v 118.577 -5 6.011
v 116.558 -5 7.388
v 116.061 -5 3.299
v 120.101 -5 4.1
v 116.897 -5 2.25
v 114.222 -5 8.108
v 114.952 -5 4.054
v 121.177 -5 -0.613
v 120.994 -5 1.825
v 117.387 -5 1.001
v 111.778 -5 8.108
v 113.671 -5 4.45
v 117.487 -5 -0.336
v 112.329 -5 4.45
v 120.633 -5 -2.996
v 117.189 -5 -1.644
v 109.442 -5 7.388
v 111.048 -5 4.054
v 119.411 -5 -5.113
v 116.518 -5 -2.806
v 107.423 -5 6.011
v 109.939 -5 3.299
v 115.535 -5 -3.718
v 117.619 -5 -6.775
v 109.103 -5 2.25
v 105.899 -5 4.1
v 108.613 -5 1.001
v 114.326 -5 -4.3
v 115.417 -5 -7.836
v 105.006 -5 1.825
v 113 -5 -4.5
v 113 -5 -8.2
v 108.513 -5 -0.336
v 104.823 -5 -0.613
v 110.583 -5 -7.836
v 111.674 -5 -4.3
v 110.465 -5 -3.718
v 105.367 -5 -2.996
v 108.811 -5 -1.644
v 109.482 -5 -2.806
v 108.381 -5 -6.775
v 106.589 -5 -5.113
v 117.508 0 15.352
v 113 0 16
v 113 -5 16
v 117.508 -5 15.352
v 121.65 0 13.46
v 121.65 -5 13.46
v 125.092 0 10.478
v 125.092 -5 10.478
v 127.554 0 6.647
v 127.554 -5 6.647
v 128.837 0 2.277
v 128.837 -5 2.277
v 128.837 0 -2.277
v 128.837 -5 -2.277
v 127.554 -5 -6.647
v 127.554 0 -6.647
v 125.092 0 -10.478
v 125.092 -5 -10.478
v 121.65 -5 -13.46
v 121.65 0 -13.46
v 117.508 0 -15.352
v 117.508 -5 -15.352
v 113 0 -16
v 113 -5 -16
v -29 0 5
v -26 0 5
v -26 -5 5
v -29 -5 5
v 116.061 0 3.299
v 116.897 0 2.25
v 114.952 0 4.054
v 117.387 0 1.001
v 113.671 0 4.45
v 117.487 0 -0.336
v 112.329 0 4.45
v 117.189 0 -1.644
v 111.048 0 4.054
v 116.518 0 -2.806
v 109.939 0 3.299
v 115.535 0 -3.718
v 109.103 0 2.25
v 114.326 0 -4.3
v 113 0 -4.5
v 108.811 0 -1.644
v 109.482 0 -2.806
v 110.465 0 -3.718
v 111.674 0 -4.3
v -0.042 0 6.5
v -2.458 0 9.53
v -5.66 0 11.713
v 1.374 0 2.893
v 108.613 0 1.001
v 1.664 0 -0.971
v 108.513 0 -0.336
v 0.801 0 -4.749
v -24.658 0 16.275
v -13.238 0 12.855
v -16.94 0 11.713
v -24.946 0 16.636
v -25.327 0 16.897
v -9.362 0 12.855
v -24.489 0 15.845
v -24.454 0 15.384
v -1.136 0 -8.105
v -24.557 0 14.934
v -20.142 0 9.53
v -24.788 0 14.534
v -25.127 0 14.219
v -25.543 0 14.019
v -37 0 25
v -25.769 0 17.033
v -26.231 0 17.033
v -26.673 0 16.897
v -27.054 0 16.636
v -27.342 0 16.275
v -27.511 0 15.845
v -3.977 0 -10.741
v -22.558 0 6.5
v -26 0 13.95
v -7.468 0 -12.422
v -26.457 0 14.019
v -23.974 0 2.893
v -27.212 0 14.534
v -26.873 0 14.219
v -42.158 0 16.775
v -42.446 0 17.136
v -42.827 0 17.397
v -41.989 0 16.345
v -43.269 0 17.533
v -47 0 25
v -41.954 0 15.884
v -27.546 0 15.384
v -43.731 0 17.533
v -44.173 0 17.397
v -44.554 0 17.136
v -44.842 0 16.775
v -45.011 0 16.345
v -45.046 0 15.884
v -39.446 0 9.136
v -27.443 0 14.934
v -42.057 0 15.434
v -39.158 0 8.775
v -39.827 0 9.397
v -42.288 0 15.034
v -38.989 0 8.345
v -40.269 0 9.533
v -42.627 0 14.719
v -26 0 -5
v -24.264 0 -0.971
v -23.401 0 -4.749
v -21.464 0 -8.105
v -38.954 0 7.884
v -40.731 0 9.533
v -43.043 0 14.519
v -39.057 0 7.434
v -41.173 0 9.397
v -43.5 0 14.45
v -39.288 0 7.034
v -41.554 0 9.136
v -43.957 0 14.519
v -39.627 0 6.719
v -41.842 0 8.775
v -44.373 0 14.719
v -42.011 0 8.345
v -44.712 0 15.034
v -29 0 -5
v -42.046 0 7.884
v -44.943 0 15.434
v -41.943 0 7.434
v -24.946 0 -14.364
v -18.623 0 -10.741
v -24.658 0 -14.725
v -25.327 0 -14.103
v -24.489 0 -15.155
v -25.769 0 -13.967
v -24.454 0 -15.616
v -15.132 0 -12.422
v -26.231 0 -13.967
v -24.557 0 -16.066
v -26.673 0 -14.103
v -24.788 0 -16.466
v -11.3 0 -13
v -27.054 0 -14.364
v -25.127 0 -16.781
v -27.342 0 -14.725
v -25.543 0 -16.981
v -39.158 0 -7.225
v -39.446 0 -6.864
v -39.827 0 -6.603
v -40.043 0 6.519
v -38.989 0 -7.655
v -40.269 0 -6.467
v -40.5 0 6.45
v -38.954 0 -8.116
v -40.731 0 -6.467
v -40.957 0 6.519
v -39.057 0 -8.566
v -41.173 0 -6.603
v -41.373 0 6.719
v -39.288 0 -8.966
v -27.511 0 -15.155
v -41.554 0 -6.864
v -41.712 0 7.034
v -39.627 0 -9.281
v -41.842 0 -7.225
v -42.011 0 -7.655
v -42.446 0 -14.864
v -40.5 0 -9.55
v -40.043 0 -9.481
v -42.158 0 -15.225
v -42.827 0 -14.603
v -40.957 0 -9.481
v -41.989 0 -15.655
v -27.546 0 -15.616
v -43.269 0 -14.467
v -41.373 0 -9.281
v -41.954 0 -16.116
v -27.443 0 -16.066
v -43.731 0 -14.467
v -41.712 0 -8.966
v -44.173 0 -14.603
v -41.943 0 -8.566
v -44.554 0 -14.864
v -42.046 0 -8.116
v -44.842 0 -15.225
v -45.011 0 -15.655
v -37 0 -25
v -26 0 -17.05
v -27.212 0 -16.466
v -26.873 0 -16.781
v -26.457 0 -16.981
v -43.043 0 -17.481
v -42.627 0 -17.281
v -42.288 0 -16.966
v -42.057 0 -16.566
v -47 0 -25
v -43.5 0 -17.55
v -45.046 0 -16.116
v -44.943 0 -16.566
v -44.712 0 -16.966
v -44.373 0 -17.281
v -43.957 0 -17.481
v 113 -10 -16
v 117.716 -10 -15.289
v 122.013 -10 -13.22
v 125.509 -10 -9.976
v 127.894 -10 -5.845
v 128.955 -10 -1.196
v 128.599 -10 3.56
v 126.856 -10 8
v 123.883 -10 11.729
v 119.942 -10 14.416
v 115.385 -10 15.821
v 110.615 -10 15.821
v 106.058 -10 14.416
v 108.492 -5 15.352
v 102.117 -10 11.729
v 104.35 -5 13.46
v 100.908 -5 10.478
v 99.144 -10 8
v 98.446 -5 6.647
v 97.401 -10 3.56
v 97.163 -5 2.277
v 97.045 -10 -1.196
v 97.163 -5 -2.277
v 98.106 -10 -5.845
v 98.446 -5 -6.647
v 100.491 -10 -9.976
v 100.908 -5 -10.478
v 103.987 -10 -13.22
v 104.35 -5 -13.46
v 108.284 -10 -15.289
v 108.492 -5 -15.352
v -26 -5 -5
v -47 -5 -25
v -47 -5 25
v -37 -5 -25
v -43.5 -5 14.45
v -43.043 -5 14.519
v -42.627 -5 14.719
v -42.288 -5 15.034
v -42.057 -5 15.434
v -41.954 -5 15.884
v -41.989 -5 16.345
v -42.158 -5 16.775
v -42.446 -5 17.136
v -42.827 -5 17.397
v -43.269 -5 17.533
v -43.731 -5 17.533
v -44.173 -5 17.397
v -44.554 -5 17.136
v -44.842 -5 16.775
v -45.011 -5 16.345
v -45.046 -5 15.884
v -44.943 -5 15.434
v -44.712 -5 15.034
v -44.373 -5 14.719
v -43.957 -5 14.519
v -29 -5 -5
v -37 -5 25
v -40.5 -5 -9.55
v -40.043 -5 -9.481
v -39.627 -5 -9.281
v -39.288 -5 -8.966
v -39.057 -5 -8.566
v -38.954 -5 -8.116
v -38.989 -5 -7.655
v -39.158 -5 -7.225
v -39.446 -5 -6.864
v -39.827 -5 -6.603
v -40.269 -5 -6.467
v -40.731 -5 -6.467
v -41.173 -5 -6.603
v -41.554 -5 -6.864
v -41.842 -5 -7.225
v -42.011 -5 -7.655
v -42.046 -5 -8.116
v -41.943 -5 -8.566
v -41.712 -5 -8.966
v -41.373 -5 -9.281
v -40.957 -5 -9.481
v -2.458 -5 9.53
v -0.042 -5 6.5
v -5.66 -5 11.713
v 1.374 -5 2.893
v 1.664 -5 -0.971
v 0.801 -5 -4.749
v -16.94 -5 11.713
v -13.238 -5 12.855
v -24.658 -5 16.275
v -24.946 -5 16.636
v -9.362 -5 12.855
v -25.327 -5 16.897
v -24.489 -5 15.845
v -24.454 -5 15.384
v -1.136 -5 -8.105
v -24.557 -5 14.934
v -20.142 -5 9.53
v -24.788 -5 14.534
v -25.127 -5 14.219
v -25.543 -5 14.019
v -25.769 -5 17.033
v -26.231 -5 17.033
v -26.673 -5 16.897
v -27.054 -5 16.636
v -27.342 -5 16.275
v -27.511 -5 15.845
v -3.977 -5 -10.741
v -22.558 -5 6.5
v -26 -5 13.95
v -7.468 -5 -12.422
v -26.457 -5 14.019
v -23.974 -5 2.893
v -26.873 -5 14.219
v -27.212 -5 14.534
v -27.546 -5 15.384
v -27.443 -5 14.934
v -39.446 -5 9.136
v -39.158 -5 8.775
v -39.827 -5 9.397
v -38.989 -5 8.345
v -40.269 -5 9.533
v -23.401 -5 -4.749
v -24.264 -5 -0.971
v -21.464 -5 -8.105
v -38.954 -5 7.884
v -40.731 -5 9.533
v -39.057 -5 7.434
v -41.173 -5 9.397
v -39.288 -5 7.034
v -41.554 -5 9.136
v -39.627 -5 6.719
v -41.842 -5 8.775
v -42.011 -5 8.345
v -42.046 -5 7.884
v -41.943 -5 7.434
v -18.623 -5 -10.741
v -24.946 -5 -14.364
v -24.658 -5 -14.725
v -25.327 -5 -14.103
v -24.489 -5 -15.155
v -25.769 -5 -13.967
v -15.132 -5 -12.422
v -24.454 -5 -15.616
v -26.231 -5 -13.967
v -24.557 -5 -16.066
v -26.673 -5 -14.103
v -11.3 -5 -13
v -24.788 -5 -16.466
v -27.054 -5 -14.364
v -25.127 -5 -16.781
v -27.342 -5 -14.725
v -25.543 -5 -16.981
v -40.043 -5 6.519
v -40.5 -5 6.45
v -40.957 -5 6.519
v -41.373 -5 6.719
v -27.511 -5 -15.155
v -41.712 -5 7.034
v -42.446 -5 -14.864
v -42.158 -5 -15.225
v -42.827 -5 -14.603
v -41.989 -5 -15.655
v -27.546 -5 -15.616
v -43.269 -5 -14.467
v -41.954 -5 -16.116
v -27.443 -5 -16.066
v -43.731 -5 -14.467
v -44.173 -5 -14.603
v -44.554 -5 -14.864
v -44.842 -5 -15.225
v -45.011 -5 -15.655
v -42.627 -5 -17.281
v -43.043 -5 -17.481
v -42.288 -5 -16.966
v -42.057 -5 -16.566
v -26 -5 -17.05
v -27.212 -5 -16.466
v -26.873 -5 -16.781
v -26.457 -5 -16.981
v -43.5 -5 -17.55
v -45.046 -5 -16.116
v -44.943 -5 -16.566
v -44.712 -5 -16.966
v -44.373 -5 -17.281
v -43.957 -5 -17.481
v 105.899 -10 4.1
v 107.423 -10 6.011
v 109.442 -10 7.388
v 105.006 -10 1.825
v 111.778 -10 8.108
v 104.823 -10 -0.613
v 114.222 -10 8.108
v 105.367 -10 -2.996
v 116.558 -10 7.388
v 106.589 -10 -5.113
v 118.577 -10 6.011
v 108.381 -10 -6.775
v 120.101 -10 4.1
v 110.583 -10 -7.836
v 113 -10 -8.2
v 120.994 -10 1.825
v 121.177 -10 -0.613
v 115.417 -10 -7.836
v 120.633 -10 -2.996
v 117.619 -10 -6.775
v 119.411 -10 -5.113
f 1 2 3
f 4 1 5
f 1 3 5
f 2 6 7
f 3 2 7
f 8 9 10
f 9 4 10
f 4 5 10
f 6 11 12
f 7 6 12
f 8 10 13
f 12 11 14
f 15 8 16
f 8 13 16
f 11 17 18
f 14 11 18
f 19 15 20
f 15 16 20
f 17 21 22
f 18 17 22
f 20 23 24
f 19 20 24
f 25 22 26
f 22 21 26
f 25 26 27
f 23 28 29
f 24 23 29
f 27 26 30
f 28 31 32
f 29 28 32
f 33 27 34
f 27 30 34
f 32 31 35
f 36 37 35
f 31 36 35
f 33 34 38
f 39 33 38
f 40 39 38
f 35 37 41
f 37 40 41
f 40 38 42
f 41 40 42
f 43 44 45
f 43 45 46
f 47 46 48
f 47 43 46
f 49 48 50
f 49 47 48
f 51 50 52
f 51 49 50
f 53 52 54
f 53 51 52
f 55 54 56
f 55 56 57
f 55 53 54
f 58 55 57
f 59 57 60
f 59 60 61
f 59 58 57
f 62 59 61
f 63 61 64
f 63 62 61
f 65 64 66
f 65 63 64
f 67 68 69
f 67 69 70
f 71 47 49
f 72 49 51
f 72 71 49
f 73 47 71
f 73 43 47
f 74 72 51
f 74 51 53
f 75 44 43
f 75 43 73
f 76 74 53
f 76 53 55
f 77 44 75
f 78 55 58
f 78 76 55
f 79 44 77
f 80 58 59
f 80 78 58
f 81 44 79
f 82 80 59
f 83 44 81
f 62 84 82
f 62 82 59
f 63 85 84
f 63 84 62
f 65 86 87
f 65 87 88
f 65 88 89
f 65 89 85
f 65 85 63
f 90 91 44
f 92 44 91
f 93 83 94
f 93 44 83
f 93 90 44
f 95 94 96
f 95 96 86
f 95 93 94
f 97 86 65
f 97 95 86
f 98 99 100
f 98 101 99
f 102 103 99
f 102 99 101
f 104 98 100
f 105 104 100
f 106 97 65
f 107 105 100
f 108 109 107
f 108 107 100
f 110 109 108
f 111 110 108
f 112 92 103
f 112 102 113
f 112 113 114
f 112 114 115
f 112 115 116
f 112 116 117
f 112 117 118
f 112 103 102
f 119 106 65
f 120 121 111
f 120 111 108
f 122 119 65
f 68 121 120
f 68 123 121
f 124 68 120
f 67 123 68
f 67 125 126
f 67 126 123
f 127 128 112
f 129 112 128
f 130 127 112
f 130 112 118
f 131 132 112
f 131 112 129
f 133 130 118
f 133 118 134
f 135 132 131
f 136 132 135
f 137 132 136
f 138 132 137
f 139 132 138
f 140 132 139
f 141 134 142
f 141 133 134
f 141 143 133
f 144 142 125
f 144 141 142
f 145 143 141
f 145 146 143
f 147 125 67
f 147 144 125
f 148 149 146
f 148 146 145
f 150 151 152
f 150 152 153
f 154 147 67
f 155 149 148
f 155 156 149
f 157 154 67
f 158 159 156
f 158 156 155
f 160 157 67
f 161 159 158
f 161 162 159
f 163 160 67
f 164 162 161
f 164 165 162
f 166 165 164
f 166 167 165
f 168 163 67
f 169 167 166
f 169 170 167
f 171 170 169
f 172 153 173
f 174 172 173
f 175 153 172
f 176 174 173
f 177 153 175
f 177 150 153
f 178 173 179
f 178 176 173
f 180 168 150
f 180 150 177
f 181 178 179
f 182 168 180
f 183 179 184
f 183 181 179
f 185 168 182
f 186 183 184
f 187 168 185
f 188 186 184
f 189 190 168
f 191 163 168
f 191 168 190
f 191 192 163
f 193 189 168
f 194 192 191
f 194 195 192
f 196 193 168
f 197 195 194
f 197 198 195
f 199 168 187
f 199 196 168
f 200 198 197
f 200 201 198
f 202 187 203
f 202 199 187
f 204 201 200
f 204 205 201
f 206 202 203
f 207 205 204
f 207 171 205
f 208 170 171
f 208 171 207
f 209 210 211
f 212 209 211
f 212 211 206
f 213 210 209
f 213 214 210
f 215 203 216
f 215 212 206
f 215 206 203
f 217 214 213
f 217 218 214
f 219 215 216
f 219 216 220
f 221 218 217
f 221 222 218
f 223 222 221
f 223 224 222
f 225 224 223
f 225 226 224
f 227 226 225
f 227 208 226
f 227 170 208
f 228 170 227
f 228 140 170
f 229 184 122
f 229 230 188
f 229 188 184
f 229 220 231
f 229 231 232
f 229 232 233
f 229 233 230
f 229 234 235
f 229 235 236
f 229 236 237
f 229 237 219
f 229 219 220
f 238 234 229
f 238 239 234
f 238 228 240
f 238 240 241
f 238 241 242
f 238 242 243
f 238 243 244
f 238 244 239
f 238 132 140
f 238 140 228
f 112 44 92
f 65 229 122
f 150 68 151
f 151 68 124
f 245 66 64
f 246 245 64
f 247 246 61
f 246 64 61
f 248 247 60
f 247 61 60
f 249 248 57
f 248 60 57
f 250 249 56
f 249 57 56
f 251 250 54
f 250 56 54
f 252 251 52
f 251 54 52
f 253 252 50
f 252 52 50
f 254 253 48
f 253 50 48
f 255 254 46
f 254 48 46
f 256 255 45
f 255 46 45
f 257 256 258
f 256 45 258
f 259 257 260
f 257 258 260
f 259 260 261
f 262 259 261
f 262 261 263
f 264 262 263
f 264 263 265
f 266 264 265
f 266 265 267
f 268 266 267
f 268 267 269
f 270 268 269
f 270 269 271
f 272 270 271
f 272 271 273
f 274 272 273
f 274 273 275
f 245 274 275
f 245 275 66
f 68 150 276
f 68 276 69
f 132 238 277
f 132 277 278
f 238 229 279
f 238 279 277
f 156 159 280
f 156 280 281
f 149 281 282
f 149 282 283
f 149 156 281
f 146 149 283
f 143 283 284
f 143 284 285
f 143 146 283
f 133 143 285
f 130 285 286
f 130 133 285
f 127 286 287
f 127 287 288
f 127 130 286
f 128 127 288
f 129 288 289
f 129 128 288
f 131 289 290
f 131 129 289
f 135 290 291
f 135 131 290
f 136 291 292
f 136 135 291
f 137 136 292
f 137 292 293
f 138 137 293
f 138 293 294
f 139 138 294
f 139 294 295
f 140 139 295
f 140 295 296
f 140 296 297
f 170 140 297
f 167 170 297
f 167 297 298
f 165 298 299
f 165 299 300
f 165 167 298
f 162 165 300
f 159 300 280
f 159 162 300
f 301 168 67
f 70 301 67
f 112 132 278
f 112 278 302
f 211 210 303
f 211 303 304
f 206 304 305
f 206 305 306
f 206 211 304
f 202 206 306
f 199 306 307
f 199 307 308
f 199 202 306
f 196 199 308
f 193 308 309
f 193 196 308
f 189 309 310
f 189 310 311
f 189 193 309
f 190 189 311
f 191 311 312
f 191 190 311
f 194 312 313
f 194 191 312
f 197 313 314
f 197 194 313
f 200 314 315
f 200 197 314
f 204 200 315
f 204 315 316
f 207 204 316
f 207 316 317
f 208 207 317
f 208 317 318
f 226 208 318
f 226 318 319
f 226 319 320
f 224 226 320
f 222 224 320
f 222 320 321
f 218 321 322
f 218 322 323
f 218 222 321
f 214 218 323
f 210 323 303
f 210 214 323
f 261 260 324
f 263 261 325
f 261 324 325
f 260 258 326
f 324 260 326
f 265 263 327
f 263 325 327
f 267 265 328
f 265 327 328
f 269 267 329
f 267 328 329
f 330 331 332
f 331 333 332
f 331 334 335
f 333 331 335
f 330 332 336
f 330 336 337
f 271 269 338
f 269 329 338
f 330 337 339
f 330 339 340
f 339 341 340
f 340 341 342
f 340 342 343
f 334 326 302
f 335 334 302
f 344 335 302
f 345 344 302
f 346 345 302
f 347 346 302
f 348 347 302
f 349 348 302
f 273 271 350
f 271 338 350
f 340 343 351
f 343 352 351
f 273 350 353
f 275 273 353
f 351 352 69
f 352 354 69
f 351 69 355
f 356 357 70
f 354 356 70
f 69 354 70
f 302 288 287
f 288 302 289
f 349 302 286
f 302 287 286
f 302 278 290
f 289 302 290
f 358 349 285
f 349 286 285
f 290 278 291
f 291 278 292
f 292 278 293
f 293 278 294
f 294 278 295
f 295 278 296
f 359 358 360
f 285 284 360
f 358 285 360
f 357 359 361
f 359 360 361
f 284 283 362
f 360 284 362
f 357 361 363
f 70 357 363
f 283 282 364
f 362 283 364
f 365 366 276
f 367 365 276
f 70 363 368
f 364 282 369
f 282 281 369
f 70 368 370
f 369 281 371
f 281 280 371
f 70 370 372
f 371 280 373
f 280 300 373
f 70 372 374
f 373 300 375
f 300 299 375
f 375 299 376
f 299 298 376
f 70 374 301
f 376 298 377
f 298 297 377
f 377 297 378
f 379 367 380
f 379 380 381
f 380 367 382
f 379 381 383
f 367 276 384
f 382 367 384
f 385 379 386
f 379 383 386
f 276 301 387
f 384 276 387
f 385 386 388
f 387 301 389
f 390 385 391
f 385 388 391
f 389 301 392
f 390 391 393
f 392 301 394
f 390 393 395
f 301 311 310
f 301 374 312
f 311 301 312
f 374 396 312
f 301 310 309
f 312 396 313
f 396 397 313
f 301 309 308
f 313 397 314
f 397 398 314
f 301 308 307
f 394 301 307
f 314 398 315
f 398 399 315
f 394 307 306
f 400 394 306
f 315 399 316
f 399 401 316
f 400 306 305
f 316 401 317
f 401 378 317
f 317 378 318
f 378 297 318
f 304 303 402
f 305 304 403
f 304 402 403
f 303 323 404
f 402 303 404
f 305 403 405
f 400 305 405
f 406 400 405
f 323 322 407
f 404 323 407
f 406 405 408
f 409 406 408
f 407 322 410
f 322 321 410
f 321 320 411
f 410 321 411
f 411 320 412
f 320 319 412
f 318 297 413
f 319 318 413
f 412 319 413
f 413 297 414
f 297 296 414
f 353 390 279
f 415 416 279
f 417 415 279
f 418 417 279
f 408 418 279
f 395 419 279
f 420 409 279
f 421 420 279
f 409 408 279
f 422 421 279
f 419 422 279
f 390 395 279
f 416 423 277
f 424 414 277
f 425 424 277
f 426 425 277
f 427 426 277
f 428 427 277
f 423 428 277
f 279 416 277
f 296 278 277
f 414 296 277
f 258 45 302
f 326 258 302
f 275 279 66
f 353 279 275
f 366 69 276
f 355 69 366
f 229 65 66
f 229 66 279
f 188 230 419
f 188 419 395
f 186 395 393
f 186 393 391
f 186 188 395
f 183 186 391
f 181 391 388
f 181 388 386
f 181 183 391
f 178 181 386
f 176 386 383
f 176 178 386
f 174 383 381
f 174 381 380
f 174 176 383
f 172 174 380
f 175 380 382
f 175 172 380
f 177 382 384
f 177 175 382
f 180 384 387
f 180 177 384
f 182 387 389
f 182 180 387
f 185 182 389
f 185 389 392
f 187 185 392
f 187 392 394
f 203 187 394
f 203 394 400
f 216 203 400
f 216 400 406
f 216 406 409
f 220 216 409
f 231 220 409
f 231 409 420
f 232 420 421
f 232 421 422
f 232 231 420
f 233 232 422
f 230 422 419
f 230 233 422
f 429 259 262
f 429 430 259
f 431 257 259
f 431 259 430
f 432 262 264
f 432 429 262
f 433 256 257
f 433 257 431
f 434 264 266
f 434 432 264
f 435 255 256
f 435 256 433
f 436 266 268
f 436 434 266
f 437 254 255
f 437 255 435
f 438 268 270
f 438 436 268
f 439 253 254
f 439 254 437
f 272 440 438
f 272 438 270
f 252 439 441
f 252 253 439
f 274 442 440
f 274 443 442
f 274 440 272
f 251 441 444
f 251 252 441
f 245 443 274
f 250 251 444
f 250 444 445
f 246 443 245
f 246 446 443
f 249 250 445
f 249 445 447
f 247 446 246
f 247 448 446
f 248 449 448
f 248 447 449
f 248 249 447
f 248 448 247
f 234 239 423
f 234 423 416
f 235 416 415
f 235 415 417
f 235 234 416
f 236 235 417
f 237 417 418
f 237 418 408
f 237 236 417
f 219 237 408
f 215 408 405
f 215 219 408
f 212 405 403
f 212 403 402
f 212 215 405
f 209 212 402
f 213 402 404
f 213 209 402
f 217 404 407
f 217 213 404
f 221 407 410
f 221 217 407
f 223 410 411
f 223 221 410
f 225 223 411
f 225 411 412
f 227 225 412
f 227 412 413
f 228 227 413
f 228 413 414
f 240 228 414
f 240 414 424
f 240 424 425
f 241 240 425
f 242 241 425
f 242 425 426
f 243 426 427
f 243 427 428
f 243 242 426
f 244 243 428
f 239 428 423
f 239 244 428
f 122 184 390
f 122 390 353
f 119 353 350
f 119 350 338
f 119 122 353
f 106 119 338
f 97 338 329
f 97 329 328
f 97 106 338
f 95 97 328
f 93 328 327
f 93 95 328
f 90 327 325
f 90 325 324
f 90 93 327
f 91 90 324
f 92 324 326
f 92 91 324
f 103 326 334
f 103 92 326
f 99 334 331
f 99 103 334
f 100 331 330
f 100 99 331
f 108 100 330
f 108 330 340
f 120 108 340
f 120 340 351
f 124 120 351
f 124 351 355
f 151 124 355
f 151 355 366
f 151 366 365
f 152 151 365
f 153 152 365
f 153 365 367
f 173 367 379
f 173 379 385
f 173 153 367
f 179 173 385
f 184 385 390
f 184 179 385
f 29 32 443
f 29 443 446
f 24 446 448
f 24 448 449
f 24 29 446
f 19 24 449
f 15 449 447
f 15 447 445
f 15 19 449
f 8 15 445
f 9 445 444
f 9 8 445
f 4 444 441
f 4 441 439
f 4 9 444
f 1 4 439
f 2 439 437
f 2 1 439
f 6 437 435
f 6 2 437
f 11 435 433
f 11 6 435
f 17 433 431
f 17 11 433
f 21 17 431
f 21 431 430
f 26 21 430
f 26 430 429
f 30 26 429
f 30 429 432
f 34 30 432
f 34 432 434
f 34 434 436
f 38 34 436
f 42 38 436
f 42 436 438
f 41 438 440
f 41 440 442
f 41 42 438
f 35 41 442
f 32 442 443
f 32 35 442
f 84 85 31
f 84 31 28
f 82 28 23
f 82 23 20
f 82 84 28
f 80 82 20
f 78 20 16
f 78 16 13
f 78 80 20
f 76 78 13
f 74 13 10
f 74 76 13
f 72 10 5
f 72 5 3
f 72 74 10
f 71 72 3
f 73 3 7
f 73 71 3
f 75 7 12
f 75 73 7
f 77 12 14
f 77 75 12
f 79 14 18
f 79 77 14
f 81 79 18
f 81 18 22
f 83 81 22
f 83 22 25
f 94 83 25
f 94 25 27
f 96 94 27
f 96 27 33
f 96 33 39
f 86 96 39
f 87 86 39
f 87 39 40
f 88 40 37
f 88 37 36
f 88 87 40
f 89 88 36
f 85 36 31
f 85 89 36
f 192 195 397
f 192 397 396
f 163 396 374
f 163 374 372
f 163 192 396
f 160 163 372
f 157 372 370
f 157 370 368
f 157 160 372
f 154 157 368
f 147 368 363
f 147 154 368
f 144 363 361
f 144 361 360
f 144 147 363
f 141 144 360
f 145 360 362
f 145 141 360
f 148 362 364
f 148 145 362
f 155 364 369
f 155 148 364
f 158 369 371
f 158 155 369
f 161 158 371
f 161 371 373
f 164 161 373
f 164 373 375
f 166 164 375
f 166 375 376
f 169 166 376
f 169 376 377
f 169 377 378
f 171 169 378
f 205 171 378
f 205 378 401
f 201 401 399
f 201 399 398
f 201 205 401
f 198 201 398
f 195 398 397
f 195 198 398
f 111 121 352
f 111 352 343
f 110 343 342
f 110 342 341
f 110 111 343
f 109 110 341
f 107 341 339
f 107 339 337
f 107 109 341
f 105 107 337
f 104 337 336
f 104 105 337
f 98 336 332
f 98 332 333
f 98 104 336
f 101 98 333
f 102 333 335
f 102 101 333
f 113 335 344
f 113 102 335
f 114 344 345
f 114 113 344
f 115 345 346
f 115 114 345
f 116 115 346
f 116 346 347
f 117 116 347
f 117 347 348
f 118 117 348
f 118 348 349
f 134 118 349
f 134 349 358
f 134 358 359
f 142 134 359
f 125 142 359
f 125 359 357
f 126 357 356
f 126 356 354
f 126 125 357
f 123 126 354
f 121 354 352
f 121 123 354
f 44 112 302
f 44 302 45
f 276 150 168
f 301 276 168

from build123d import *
from build123d.topology import SkipClean

# Parameters (mm, degrees)
SKETCH28_R           = 1.55
SKETCH28_R_2         = 13
SKETCH28_R_3         = 4.5
SKETCH28_W           = 10
SKETCH28_H           = 3
BOSS_EXTRUDE10_DEPTH = 5
SKETCH29_R           = 16
SKETCH29_R_2         = 8.2
BOSS_EXTRUDE11_DEPTH = 5


with BuildPart() as part:
    # Sketch28 → Boss-Extrude10 (new body)
    with BuildSketch(Plane(origin=(-32, 0, 0), x_dir=(0, 0, 1), z_dir=(0, -1, 0))):
        with BuildLine():
            Line((-25, 15), (25, 15))
            Line((25, 15), (25, 5))
            Line((25, 5), (16, -145))
            ThreePointArc((16, -145), (0, -161), (-16, -145))
            Line((-16, -145), (-25, 5))
            Line((-25, 5), (-25, 15))
        make_face()
        with Locations((8, 8.5)):
            Circle(SKETCH28_R, mode=Mode.SUBTRACT)
        with Locations((-8, 8.5)):
            Circle(SKETCH28_R, mode=Mode.SUBTRACT)
        with Locations((16, 11.5)):
            Circle(SKETCH28_R, mode=Mode.SUBTRACT)
        with Locations((-16, 11.5)):
            Circle(SKETCH28_R, mode=Mode.SUBTRACT)
        with Locations((-15.5, -6)):
            Circle(SKETCH28_R, mode=Mode.SUBTRACT)
        with Locations((15.5, -6)):
            Circle(SKETCH28_R, mode=Mode.SUBTRACT)
        with Locations((0, -20.7)):
            Circle(SKETCH28_R_2, mode=Mode.SUBTRACT)
        with Locations((0, -145)):
            Circle(SKETCH28_R_3, mode=Mode.SUBTRACT)
        with Locations((0, -4.5)):
            Rectangle(SKETCH28_W, SKETCH28_H, mode=Mode.SUBTRACT)
    extrude(amount=BOSS_EXTRUDE10_DEPTH)

    # Sketch29 → Boss-Extrude11 (add)
    with SkipClean():  # the faces are left unmerged after this step: merging them gives an invalid solid
        with BuildSketch(Plane.XZ.offset(5)):
            with Locations((113, 0)):
                Circle(SKETCH29_R)
            with Locations((113, 0)):
                Circle(SKETCH29_R_2, mode=Mode.SUBTRACT)
        extrude(amount=BOSS_EXTRUDE11_DEPTH)
    add(part.part.scale(1), mode=Mode.REPLACE)  # the faces are merged on a copy


solid = part.part
